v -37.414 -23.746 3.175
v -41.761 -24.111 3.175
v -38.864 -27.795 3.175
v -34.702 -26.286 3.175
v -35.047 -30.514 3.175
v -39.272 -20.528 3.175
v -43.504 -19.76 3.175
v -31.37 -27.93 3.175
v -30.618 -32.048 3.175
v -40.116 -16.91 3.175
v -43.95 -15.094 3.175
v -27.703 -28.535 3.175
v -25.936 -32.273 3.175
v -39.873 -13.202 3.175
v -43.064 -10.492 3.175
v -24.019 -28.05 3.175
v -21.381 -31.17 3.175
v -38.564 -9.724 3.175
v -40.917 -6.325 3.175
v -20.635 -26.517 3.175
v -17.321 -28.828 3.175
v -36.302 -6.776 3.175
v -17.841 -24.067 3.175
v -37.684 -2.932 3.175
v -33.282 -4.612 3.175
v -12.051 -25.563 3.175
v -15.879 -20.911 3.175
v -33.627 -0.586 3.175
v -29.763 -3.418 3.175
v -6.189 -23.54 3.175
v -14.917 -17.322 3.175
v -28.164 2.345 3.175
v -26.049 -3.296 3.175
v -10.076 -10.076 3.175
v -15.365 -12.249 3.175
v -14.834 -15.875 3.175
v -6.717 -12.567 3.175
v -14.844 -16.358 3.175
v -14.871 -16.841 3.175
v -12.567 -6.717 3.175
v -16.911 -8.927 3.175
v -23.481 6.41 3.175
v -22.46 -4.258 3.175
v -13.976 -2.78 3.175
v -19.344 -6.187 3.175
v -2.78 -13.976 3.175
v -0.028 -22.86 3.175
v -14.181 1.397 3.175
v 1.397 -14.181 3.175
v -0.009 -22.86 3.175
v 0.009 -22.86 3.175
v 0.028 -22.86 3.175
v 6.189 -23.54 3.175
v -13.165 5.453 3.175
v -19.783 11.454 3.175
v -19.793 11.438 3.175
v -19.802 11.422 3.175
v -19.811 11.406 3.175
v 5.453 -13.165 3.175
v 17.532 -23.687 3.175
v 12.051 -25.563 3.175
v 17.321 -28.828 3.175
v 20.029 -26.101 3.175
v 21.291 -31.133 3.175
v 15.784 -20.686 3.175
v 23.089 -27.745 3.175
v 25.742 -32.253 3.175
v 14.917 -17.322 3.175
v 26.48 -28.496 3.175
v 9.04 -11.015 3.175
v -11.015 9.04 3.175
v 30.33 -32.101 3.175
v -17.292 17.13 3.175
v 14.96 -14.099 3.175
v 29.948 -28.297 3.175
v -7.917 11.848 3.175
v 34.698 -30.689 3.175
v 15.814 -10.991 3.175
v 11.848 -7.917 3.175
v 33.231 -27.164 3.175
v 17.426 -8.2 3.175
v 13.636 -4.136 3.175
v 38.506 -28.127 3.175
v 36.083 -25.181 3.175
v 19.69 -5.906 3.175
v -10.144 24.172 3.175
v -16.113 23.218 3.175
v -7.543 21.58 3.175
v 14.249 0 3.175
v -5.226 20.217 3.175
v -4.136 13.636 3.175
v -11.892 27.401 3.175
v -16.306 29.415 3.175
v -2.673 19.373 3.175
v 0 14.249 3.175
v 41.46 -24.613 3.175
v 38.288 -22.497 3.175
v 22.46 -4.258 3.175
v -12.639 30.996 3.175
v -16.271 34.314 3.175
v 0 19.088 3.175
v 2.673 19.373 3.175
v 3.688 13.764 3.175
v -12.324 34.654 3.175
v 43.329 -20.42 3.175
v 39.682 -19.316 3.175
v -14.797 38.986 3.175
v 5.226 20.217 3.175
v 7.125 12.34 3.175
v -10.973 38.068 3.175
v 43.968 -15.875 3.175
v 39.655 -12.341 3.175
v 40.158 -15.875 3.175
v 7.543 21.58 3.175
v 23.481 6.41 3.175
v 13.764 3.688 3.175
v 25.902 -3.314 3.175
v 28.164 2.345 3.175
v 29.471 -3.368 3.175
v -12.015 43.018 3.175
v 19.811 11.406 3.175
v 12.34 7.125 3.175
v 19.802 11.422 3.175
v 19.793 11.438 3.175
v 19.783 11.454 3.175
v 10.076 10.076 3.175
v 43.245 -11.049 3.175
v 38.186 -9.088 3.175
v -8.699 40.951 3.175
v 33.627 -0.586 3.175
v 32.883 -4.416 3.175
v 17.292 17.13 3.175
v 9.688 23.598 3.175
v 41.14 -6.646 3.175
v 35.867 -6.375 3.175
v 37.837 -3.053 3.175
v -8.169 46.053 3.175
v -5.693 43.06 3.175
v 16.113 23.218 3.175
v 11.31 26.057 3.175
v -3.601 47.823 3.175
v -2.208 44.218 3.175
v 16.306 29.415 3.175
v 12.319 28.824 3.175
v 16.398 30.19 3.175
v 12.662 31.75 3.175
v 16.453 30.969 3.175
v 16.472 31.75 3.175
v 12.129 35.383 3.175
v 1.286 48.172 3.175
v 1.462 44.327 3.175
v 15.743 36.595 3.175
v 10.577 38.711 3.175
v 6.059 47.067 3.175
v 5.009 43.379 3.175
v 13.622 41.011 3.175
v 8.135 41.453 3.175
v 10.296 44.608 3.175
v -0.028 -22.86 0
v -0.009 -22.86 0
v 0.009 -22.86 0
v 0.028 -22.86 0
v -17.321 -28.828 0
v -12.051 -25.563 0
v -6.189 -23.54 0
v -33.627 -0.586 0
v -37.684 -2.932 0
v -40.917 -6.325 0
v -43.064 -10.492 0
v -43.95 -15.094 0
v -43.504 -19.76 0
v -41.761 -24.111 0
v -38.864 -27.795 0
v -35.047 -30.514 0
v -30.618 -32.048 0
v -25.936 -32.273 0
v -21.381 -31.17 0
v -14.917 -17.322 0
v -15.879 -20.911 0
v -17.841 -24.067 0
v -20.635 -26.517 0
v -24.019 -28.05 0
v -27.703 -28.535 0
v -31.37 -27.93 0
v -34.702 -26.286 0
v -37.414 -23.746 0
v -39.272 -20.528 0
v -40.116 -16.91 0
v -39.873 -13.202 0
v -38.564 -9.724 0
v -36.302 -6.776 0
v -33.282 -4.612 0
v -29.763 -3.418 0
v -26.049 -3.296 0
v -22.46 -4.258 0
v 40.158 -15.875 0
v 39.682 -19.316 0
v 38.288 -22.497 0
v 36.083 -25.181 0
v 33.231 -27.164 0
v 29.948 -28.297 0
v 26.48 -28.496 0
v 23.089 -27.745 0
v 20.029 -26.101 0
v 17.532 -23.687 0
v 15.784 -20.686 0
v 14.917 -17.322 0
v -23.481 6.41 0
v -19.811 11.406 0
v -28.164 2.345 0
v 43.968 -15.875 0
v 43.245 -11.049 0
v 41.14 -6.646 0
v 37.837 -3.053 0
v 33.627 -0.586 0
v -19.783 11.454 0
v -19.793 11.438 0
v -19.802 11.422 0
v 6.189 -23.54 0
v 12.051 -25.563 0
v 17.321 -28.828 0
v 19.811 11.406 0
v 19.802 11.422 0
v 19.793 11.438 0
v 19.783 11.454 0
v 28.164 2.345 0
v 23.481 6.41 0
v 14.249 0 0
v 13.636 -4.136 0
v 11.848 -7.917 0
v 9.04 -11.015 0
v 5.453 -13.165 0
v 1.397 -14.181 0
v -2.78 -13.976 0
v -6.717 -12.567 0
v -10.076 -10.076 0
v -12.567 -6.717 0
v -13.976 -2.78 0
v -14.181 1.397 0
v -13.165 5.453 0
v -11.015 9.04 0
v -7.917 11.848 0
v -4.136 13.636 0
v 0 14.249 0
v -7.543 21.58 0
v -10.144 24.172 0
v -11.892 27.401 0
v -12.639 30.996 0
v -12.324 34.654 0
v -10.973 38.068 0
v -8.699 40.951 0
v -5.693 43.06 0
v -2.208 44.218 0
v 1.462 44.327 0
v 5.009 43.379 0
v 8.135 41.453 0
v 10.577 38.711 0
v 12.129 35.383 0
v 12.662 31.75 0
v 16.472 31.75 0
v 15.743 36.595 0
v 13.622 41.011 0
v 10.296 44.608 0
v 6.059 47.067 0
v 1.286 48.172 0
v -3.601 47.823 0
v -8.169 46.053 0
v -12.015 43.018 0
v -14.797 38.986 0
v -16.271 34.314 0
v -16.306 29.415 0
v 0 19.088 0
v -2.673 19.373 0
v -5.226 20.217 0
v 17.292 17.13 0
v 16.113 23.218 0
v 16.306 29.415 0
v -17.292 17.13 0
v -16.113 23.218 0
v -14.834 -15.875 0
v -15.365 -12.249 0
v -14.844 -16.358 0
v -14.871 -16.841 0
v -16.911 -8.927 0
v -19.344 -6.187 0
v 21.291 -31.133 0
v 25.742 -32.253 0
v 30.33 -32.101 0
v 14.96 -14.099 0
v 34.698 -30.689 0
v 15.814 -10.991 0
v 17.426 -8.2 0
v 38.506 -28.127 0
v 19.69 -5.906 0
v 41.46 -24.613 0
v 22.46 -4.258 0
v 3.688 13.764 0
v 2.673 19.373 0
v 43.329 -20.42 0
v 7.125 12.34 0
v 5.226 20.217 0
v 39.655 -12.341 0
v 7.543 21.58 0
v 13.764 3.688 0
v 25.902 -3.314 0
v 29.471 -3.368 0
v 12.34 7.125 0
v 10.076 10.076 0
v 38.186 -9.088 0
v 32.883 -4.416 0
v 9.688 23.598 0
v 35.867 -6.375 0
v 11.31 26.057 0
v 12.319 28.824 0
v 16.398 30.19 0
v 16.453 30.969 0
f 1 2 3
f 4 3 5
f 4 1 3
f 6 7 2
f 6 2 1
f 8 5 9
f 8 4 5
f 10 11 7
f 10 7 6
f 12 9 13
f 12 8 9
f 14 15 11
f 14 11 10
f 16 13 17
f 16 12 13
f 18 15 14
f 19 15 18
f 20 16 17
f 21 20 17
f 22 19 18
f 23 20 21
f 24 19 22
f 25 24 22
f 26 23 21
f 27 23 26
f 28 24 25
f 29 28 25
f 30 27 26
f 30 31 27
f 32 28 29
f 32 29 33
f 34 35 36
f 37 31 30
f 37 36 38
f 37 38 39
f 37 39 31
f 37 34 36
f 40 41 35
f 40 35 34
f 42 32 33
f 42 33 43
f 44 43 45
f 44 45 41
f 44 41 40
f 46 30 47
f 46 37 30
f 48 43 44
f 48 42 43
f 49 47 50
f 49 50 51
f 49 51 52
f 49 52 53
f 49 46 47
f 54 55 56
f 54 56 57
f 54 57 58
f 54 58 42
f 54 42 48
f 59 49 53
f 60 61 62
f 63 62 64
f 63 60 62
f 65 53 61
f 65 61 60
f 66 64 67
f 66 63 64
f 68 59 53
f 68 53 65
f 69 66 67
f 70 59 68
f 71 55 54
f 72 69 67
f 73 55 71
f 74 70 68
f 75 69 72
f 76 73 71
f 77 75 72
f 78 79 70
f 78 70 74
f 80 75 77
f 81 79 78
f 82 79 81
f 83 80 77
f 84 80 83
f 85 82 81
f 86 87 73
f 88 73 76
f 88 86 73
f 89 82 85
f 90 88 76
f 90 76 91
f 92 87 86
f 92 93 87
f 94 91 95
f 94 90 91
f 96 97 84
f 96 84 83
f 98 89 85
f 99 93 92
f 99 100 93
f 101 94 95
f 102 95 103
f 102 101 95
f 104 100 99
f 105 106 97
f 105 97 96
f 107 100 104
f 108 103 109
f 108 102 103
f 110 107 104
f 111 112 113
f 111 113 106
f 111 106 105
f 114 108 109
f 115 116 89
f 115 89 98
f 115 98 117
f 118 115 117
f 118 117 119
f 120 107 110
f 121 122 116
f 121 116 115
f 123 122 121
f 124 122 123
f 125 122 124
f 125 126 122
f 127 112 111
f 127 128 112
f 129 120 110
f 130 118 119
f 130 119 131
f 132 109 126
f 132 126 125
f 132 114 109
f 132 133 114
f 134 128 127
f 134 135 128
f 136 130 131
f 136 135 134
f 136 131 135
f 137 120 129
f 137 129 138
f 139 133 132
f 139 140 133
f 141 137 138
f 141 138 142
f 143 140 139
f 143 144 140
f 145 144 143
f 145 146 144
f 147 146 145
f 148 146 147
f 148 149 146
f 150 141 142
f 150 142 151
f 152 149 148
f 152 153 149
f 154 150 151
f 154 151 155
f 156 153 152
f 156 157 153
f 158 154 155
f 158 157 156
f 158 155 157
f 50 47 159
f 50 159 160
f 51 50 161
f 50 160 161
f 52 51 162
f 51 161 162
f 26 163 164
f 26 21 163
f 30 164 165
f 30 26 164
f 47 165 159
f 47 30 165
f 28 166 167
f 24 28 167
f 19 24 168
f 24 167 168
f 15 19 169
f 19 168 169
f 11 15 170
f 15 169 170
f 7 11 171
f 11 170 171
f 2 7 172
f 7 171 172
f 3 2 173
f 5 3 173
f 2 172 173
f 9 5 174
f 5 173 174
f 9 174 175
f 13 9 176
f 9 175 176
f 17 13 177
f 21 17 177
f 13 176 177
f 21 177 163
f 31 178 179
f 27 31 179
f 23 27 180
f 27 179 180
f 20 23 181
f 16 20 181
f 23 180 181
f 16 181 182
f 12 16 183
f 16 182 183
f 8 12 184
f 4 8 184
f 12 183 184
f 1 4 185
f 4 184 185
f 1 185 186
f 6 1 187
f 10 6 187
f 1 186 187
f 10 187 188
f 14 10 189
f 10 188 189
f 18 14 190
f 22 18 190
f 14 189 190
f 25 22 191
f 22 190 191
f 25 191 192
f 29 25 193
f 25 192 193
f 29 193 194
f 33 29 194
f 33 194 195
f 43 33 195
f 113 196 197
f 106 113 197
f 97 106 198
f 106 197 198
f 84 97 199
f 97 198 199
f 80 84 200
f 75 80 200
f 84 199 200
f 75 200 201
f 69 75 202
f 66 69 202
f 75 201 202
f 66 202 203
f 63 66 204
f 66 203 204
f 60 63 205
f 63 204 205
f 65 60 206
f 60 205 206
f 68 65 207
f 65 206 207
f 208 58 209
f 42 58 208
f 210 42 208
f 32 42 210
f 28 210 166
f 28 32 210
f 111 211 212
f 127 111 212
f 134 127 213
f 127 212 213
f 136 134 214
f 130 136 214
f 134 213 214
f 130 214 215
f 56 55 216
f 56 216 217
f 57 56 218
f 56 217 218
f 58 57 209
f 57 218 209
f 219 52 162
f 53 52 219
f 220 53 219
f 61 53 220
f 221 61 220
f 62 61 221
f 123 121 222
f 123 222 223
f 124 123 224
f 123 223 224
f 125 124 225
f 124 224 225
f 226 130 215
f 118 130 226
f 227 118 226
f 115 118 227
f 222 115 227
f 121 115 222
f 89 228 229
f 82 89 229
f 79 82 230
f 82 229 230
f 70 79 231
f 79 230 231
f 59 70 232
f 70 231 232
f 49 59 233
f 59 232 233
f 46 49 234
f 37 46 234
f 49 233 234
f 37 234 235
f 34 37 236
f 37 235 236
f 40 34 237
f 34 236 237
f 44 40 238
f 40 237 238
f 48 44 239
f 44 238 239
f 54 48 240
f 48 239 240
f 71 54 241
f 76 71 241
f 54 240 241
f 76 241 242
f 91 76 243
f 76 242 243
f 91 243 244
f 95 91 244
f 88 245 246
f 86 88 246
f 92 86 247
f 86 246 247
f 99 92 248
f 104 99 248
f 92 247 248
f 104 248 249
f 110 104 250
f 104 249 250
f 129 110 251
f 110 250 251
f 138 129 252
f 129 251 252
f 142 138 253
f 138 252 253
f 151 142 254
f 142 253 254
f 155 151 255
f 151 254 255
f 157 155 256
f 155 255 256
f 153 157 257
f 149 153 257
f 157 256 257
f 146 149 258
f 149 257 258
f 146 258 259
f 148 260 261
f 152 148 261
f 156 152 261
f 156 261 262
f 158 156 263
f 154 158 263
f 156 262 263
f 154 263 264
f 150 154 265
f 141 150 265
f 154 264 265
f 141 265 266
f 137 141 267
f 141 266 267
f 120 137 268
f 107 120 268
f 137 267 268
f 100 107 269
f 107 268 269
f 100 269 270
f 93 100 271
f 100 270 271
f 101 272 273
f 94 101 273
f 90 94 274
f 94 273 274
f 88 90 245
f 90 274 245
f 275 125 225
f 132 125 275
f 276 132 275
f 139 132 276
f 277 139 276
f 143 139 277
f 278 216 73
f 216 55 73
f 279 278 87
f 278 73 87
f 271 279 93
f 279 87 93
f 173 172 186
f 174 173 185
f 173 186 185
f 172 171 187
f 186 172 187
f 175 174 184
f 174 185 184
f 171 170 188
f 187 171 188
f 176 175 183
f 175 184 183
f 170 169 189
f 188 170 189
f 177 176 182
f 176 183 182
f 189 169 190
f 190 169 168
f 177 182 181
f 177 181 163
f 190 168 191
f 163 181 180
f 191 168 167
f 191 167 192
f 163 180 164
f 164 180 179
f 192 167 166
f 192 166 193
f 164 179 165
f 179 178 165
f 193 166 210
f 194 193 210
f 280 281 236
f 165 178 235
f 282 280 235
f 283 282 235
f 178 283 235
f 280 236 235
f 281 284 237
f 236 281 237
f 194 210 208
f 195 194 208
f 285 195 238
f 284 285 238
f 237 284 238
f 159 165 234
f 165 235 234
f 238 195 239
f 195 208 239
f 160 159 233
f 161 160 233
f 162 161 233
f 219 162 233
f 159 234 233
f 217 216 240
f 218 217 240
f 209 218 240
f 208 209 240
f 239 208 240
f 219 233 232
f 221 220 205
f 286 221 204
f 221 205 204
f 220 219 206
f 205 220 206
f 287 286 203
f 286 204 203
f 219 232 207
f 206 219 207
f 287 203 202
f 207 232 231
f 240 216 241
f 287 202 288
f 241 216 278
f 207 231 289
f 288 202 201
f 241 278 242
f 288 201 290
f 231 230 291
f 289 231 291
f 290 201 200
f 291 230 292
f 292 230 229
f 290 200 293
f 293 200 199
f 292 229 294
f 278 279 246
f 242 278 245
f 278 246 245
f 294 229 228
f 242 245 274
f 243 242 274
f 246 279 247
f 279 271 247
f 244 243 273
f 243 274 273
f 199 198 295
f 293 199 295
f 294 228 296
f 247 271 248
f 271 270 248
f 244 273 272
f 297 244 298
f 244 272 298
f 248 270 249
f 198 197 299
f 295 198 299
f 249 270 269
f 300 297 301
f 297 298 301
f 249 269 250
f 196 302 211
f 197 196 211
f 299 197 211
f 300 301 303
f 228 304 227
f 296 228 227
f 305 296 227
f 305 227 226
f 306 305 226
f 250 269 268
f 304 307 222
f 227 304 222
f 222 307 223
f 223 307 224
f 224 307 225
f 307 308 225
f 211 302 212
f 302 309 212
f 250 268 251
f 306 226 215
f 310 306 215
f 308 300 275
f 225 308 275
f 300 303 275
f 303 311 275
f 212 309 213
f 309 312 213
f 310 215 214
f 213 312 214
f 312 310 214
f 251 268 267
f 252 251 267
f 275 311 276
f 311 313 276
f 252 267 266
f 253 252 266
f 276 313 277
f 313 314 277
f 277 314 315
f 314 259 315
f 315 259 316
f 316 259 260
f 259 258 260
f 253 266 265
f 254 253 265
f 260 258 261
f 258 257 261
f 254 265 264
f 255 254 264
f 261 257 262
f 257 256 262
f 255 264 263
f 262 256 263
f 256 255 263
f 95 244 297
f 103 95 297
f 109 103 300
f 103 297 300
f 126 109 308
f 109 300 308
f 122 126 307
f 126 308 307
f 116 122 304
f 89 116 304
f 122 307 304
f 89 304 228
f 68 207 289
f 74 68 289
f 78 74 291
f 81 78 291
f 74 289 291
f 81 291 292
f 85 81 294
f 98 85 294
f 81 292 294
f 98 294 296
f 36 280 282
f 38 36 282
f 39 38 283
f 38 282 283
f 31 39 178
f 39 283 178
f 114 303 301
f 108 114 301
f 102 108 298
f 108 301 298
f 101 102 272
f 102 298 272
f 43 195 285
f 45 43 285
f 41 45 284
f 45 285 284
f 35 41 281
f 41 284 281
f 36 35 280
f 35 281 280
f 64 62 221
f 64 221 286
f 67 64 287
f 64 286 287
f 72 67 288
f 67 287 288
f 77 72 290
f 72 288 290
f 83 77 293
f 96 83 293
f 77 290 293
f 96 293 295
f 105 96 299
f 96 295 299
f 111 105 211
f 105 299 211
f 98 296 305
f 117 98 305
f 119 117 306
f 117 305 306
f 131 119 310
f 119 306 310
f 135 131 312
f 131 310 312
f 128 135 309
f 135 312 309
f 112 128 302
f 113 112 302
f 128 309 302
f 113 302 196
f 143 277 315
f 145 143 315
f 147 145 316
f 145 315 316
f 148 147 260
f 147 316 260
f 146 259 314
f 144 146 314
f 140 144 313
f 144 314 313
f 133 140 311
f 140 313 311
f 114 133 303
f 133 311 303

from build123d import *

# Parameters (mm, degrees)
F1_DEPTH = 3.175
F2_R     = 27.94


with BuildPart() as f1:
    # F0 (on Top) → F1 (new body)
    with BuildSketch(Plane.XY):
        with BuildLine():
            ThreePointArc((11.3701248677, 19.83178914), (6.1240473604, 16.4588413278), (0, 15.2781))
            ThreePointArc((0, 15.2781), (-6.1240473604, 16.4588413278), (-11.3701248677, 19.83178914))
            ThreePointArc((-11.3701248677, 19.83178914), (-19.7973407305, 11.43), (-22.8598956316, -0.0690775904))
            ThreePointArc((-22.8598956316, -0.0690775904), (-14.3112015848, -6.0019814071), (-11.0244065702, -15.875))
            ThreePointArc((-11.0244065702, -15.875), (-11.1411614048, -17.8327324208), (-11.4897707639, -19.7627115496))
            ThreePointArc((-11.4897707639, -19.7627115496), (0, -22.86), (11.4897707639, -19.7627115496))
            ThreePointArc((11.4897707639, -19.7627115496), (13.2312227216, -7.63905), (22.8598956316, -0.0690775904))
            ThreePointArc((22.8598956316, -0.0690775904), (22.8599739079, -0.0345388346), (22.86, 0))
            ThreePointArc((22.86, 0), (19.7800487168, 11.4598984621), (11.3701248677, 19.83178914))
        make_face()
        with BuildLine():
            ThreePointArc((14.2494, 0), (-10.0758473678, -10.0758473678), (0, 14.2494))
            ThreePointArc((0, 14.2494), (10.0758473678, 10.0758473678), (14.2494, 0))
        make_face(mode=Mode.SUBTRACT)
        with BuildLine():
            ThreePointArc((-11.3701248677, 19.83178914), (-6.1240473604, 16.4588413278), (0, 15.2781))
            Line((0, 15.2781), (0, 19.0881))
            ThreePointArc((0, 19.0881), (-3.9717674438, 19.7271561192), (-7.5426183918, 21.57981714))
            ThreePointArc((-7.5426183918, 21.57981714), (-9.4966765172, 20.7940552834), (-11.3701248677, 19.83178914))
        make_face()
        with BuildLine():
            Line((0, 19.0881), (0, 15.2781))
            ThreePointArc((0, 15.2781), (6.1240473604, 16.4588413278), (11.3701248677, 19.83178914))
            ThreePointArc((11.3701248677, 19.83178914), (9.4966765172, 20.7940552834), (7.5426183918, 21.57981714))
            ThreePointArc((7.5426183918, 21.57981714), (3.9717674438, 19.7271561192), (0, 19.0881))
        make_face()
        with BuildLine():
            ThreePointArc((16.4719, 31.75), (-6.4821265724, 46.8928374061), (-11.3701248677, 19.83178914))
            ThreePointArc((-11.3701248677, 19.83178914), (-9.4966765172, 20.7940552834), (-7.5426183918, 21.57981714))
            ThreePointArc((-7.5426183918, 21.57981714), (-5.6929707445, 43.0598981301), (12.6619, 31.75))
            ThreePointArc((12.6619, 31.75), (11.3098981301, 26.0570292555), (7.5426183918, 21.57981714))
            ThreePointArc((7.5426183918, 21.57981714), (9.4966765172, 20.7940552834), (11.3701248677, 19.83178914))
            ThreePointArc((11.3701248677, 19.83178914), (15.1428374061, 25.2678734276), (16.4719, 31.75))
        make_face()
        with BuildLine():
            ThreePointArc((-22.4599790482, -4.2578094317), (-22.7565183817, -2.1726645263), (-22.8598956316, -0.0690775904))
            ThreePointArc((-22.8598956316, -0.0690775904), (-41.7613904188, -24.11095), (-11.4897707639, -19.7627115496))
            ThreePointArc((-11.4897707639, -19.7627115496), (-13.2598418645, -18.6213907571), (-14.9173606564, -17.3220077083))
            ThreePointArc((-14.9173606564, -17.3220077083), (-38.4618336303, -22.20595), (-22.4599790482, -4.2578094317))
        make_face()
        with BuildLine():
            ThreePointArc((-11.0244065702, -15.875), (-14.3112015848, -6.0019814071), (-22.8598956316, -0.0690775904))
            ThreePointArc((-22.8598956316, -0.0690775904), (-22.7565183817, -2.1726645263), (-22.4599790482, -4.2578094317))
            ThreePointArc((-22.4599790482, -4.2578094317), (-16.9111002174, -8.9268262774), (-14.8344065702, -15.875))
            ThreePointArc((-14.8344065702, -15.875), (-14.8551621031, -16.5996917773), (-14.9173606564, -17.3220077083))
            ThreePointArc((-14.9173606564, -17.3220077083), (-13.2598418645, -18.6213907571), (-11.4897707639, -19.7627115496))
            ThreePointArc((-11.4897707639, -19.7627115496), (-11.1411614048, -17.8327324208), (-11.0244065702, -15.875))
        make_face()
        with BuildLine():
            ThreePointArc((22.4599790482, -4.2578094317), (22.7565183817, -2.1726645263), (22.8598956316, -0.0690775904))
            ThreePointArc((22.8598956316, -0.0690775904), (13.2312227216, -7.63905), (11.4897707639, -19.7627115496))
            ThreePointArc((11.4897707639, -19.7627115496), (13.2598418645, -18.6213907571), (14.9173606564, -17.3220077083))
            ThreePointArc((14.9173606564, -17.3220077083), (16.53077951, -9.54405), (22.4599790482, -4.2578094317))
        make_face()
        with BuildLine():
            ThreePointArc((43.9682065702, -15.875), (37.369325163, -2.6898950147), (22.8598956316, -0.0690775904))
            ThreePointArc((22.8598956316, -0.0690775904), (22.7565183817, -2.1726645263), (22.4599790482, -4.2578094317))
            ThreePointArc((22.4599790482, -4.2578094317), (34.4444802928, -5.2897936472), (40.1582065702, -15.875))
            ThreePointArc((40.1582065702, -15.875), (28.2209983475, -28.5161444671), (14.9173606564, -17.3220077083))
            ThreePointArc((14.9173606564, -17.3220077083), (13.2598418645, -18.6213907571), (11.4897707639, -19.7627115496))
            ThreePointArc((11.4897707639, -19.7627115496), (29.454038991, -32.2301451653), (43.9682065702, -15.875))
        make_face()
    extrude(amount=F1_DEPTH)

    # F2
    f2_edges = [f1.edges().sort_by_distance(p)[0] for p in [
        (-11.370125, 19.831789, 1.5875),
        (-22.859896, -0.069078, 1.5875),
        (-11.489771, -19.762712, 1.5875),
        (22.859896, -0.069078, 1.5875),
        (11.489771, -19.762712, 1.5875),
        (11.370125, 19.831789, 1.5875),
    ]]
    fillet(f2_edges, radius=F2_R)


solid = f1.part
